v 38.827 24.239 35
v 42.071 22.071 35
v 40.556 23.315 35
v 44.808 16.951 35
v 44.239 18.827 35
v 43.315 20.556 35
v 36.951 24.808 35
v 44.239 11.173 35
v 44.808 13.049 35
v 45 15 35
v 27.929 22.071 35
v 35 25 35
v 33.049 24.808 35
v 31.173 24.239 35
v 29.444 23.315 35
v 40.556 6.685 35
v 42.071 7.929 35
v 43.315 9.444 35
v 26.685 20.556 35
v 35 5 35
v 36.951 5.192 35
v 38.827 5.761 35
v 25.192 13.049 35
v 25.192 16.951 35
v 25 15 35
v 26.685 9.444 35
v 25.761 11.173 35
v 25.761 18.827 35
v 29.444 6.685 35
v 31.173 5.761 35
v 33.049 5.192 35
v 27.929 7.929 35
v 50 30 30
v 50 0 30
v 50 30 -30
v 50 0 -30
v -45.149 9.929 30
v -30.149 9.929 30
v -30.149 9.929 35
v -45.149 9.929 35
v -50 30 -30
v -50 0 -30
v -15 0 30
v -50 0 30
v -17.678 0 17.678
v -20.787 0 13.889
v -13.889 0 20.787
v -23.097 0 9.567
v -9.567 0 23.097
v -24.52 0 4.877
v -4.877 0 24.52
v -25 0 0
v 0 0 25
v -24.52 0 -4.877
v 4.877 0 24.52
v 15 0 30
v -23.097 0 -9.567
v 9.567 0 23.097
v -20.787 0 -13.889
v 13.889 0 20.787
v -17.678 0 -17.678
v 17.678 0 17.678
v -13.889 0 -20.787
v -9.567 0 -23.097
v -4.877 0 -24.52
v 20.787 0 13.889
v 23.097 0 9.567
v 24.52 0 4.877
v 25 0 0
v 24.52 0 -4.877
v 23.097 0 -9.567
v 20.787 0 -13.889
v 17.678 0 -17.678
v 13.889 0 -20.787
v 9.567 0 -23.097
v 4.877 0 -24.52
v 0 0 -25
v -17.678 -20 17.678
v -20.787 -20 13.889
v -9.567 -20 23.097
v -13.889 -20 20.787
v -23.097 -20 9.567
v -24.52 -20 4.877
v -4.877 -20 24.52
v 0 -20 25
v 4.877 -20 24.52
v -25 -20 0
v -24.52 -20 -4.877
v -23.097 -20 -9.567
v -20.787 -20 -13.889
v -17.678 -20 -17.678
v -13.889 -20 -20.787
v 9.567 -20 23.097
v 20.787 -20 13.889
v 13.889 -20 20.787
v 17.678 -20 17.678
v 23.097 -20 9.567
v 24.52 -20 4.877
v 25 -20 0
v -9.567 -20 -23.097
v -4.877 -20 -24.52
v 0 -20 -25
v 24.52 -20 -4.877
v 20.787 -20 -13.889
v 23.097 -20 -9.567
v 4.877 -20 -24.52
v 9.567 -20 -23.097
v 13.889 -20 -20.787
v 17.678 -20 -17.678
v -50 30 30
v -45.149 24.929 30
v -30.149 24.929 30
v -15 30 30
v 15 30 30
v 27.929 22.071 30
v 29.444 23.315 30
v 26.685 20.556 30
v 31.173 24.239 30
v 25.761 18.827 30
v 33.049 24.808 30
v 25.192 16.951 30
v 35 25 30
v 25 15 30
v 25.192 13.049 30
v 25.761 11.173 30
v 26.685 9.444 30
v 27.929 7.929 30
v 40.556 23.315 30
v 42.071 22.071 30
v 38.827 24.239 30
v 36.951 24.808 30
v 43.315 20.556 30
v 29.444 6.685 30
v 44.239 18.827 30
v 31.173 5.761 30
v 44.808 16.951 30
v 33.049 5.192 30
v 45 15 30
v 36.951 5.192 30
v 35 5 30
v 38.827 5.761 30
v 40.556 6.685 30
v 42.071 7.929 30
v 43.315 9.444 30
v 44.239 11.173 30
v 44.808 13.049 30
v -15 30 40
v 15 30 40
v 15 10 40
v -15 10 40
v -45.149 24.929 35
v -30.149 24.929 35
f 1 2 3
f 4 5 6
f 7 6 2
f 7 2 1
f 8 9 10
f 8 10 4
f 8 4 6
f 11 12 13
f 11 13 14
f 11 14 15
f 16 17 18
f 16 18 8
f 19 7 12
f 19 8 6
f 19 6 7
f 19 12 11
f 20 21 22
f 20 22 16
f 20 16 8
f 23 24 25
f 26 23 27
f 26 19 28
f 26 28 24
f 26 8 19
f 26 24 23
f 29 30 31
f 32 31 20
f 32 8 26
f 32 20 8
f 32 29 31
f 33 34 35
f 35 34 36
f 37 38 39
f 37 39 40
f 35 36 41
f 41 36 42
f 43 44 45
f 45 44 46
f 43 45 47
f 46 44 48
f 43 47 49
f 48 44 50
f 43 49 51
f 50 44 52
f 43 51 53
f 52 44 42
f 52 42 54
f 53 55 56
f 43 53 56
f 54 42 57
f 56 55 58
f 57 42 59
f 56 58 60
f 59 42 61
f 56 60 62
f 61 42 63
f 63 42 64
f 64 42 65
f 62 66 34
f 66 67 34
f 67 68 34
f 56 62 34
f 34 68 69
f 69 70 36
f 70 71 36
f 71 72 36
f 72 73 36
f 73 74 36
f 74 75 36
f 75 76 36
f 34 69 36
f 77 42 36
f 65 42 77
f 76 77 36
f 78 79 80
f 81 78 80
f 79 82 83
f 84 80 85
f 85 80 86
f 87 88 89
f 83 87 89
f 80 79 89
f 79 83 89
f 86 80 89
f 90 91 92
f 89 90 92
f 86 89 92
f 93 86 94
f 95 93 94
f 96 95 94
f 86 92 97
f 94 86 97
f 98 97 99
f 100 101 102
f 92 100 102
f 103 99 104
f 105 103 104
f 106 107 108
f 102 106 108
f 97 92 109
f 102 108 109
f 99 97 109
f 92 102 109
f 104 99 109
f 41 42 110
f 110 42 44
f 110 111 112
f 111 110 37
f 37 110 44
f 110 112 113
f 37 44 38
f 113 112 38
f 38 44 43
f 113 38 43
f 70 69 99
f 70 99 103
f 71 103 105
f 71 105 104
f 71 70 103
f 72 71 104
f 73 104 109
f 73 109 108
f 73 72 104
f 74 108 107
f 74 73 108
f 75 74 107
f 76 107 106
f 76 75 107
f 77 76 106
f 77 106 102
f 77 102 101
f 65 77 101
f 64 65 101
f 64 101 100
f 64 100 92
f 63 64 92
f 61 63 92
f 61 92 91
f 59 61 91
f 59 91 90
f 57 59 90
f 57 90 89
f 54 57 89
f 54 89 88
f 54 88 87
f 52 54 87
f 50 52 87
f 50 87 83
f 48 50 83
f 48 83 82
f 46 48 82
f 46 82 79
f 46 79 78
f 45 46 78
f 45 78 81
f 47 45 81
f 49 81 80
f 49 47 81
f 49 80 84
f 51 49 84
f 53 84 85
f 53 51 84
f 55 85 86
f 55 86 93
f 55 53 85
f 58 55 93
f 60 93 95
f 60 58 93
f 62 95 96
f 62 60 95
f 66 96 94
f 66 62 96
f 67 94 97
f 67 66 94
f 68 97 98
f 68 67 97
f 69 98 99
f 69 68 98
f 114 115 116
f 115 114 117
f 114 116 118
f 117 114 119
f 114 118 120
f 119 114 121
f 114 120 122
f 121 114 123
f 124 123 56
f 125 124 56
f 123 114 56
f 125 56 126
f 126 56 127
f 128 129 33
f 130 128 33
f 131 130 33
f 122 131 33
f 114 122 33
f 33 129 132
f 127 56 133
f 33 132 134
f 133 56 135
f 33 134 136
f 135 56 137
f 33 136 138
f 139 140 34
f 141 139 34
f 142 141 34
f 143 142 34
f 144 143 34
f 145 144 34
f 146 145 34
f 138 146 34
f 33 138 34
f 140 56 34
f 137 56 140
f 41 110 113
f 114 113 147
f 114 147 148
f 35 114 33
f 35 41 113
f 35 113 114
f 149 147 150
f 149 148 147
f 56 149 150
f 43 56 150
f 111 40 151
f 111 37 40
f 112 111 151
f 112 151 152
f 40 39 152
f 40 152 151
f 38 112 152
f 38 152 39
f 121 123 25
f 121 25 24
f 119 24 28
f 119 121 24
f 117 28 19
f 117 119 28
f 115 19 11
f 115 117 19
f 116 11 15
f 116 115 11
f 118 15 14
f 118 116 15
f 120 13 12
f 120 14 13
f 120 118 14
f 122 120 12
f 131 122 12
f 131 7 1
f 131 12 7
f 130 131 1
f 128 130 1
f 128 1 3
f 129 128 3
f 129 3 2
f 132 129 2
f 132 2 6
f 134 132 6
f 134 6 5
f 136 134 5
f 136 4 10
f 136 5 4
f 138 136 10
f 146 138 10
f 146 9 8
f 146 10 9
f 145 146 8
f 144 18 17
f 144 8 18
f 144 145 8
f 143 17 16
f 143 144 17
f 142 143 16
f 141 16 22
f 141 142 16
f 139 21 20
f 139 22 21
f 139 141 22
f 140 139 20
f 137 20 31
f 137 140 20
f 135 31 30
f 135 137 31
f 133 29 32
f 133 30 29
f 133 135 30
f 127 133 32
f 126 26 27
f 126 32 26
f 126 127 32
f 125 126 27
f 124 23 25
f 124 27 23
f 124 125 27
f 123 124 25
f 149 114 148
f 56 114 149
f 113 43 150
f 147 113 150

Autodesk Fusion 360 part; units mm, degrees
sketch "Sketch1" plane through (0, 0, 0) normal (0, 1, 0) x (1, 0, 0)
  line L0 (50, 30) -> (-50, 30)
  line L1 (-50, 30) -> (-50, -30)
  line L2 (-50, -30) -> (50, -30)
  line L3 (50, -30) -> (50, 30)
  line L4 (50, 30) -> (-50, -30) construction
  line L5 (-50, 30) -> (50, -30) construction
  dimension "d1" = 100
  dimension "d2" = 60
extrude "Extrude1" add sketch "Sketch1" along normal blind 30
sketch "Sketch2" plane through (0, 0, 0) normal (0, 1, 0) x (1, 0, 0)
  circle A0 centre (0, 0) radius 25
  dimension "d5" = 50
extrude "Extrude2" add sketch "Sketch2" against normal blind 20
sketch "Sketch3" plane through (0, 0, 0) normal (0, -1, 0) x (1, 0, 0)
  circle A0 centre (0, 0) radius 25
  line L0 (50, -30) -> (50, 30)
  line L1 (50, 30) -> (-50, 30)
  line L2 (-50, 30) -> (-50, -30)
  line L3 (-50, -30) -> (50, -30)
sketch "Sketch4" plane through (0, 0, 30) normal (0, 0, 1) x (-1, 0, 0)
  line L0 (50, 0) -> (-50, 0)
  line L1 (-50, 0) -> (-50, -30)
  line L2 (-50, -30) -> (50, -30)
  line L3 (50, -30) -> (50, 0)
  circle A0 centre (-35, -15) radius 10
  line L4 (42.5777, -25.1555) -> (27.5777, -25.1555)
  line L5 (27.5777, -25.1555) -> (27.5777, -10.1555)
  line L6 (27.5777, -10.1555) -> (42.5777, -10.1555)
  line L7 (42.5777, -10.1555) -> (42.5777, -25.1555)
  dimension "d8" = 20
  dimension "d9" = 15
  dimension "d10" = 15
extrude "Extrude3" add sketch "Sketch4" along normal blind 5 contours A0
sketch "Sketch5" plane through (0, 0, 30) normal (0, 0, 1) x (-1, 0, 0)
  circle A0 centre (-35, -15) radius 10
  line L0 (50, 0) -> (-50, 0)
  line L1 (-50, 0) -> (-50, -30)
  line L2 (-50, -30) -> (50, -30)
  line L3 (50, -30) -> (50, 0)
  line L4 (45.1493, -24.9291) -> (30.1493, -24.9291)
  line L5 (30.1493, -24.9291) -> (30.1493, -9.9291)
  line L6 (30.1493, -9.9291) -> (45.1493, -9.9291)
  line L7 (45.1493, -9.9291) -> (45.1493, -24.9291)
  dimension "d13" = 15
  dimension "d14" = 15
extrude "Extrude4" add sketch "Sketch5" along normal blind 5 contours L4 L5 L6 L7
sketch "Sketch6" plane through (0, 0, 30) normal (0, 0, 1) x (-1, 0, 0)
  line L0 (45.1493, -9.9291) -> (45.1493, -24.9291)
  line L1 (45.1493, -24.9291) -> (30.1493, -24.9291)
  line L2 (30.1493, -24.9291) -> (30.1493, -9.9291)
  line L3 (30.1493, -9.9291) -> (45.1493, -9.9291)
  circle A0 centre (-35, -15) radius 10
  line L4 (50, 0) -> (-50, 0)
  line L5 (-50, 0) -> (-50, -30)
  line L6 (-50, -30) -> (50, -30)
  line L7 (50, -30) -> (50, 0)
box "BoxPrimitive1" add length 30 width 30 height 10 placed x (0, -1, 0) y (1, 0, 0) z (0, 0, 1) at (-15, 30, 30)
chamfer "Chamfer1" distance 10 angle 45 1 edges at (0, 0, 40)
